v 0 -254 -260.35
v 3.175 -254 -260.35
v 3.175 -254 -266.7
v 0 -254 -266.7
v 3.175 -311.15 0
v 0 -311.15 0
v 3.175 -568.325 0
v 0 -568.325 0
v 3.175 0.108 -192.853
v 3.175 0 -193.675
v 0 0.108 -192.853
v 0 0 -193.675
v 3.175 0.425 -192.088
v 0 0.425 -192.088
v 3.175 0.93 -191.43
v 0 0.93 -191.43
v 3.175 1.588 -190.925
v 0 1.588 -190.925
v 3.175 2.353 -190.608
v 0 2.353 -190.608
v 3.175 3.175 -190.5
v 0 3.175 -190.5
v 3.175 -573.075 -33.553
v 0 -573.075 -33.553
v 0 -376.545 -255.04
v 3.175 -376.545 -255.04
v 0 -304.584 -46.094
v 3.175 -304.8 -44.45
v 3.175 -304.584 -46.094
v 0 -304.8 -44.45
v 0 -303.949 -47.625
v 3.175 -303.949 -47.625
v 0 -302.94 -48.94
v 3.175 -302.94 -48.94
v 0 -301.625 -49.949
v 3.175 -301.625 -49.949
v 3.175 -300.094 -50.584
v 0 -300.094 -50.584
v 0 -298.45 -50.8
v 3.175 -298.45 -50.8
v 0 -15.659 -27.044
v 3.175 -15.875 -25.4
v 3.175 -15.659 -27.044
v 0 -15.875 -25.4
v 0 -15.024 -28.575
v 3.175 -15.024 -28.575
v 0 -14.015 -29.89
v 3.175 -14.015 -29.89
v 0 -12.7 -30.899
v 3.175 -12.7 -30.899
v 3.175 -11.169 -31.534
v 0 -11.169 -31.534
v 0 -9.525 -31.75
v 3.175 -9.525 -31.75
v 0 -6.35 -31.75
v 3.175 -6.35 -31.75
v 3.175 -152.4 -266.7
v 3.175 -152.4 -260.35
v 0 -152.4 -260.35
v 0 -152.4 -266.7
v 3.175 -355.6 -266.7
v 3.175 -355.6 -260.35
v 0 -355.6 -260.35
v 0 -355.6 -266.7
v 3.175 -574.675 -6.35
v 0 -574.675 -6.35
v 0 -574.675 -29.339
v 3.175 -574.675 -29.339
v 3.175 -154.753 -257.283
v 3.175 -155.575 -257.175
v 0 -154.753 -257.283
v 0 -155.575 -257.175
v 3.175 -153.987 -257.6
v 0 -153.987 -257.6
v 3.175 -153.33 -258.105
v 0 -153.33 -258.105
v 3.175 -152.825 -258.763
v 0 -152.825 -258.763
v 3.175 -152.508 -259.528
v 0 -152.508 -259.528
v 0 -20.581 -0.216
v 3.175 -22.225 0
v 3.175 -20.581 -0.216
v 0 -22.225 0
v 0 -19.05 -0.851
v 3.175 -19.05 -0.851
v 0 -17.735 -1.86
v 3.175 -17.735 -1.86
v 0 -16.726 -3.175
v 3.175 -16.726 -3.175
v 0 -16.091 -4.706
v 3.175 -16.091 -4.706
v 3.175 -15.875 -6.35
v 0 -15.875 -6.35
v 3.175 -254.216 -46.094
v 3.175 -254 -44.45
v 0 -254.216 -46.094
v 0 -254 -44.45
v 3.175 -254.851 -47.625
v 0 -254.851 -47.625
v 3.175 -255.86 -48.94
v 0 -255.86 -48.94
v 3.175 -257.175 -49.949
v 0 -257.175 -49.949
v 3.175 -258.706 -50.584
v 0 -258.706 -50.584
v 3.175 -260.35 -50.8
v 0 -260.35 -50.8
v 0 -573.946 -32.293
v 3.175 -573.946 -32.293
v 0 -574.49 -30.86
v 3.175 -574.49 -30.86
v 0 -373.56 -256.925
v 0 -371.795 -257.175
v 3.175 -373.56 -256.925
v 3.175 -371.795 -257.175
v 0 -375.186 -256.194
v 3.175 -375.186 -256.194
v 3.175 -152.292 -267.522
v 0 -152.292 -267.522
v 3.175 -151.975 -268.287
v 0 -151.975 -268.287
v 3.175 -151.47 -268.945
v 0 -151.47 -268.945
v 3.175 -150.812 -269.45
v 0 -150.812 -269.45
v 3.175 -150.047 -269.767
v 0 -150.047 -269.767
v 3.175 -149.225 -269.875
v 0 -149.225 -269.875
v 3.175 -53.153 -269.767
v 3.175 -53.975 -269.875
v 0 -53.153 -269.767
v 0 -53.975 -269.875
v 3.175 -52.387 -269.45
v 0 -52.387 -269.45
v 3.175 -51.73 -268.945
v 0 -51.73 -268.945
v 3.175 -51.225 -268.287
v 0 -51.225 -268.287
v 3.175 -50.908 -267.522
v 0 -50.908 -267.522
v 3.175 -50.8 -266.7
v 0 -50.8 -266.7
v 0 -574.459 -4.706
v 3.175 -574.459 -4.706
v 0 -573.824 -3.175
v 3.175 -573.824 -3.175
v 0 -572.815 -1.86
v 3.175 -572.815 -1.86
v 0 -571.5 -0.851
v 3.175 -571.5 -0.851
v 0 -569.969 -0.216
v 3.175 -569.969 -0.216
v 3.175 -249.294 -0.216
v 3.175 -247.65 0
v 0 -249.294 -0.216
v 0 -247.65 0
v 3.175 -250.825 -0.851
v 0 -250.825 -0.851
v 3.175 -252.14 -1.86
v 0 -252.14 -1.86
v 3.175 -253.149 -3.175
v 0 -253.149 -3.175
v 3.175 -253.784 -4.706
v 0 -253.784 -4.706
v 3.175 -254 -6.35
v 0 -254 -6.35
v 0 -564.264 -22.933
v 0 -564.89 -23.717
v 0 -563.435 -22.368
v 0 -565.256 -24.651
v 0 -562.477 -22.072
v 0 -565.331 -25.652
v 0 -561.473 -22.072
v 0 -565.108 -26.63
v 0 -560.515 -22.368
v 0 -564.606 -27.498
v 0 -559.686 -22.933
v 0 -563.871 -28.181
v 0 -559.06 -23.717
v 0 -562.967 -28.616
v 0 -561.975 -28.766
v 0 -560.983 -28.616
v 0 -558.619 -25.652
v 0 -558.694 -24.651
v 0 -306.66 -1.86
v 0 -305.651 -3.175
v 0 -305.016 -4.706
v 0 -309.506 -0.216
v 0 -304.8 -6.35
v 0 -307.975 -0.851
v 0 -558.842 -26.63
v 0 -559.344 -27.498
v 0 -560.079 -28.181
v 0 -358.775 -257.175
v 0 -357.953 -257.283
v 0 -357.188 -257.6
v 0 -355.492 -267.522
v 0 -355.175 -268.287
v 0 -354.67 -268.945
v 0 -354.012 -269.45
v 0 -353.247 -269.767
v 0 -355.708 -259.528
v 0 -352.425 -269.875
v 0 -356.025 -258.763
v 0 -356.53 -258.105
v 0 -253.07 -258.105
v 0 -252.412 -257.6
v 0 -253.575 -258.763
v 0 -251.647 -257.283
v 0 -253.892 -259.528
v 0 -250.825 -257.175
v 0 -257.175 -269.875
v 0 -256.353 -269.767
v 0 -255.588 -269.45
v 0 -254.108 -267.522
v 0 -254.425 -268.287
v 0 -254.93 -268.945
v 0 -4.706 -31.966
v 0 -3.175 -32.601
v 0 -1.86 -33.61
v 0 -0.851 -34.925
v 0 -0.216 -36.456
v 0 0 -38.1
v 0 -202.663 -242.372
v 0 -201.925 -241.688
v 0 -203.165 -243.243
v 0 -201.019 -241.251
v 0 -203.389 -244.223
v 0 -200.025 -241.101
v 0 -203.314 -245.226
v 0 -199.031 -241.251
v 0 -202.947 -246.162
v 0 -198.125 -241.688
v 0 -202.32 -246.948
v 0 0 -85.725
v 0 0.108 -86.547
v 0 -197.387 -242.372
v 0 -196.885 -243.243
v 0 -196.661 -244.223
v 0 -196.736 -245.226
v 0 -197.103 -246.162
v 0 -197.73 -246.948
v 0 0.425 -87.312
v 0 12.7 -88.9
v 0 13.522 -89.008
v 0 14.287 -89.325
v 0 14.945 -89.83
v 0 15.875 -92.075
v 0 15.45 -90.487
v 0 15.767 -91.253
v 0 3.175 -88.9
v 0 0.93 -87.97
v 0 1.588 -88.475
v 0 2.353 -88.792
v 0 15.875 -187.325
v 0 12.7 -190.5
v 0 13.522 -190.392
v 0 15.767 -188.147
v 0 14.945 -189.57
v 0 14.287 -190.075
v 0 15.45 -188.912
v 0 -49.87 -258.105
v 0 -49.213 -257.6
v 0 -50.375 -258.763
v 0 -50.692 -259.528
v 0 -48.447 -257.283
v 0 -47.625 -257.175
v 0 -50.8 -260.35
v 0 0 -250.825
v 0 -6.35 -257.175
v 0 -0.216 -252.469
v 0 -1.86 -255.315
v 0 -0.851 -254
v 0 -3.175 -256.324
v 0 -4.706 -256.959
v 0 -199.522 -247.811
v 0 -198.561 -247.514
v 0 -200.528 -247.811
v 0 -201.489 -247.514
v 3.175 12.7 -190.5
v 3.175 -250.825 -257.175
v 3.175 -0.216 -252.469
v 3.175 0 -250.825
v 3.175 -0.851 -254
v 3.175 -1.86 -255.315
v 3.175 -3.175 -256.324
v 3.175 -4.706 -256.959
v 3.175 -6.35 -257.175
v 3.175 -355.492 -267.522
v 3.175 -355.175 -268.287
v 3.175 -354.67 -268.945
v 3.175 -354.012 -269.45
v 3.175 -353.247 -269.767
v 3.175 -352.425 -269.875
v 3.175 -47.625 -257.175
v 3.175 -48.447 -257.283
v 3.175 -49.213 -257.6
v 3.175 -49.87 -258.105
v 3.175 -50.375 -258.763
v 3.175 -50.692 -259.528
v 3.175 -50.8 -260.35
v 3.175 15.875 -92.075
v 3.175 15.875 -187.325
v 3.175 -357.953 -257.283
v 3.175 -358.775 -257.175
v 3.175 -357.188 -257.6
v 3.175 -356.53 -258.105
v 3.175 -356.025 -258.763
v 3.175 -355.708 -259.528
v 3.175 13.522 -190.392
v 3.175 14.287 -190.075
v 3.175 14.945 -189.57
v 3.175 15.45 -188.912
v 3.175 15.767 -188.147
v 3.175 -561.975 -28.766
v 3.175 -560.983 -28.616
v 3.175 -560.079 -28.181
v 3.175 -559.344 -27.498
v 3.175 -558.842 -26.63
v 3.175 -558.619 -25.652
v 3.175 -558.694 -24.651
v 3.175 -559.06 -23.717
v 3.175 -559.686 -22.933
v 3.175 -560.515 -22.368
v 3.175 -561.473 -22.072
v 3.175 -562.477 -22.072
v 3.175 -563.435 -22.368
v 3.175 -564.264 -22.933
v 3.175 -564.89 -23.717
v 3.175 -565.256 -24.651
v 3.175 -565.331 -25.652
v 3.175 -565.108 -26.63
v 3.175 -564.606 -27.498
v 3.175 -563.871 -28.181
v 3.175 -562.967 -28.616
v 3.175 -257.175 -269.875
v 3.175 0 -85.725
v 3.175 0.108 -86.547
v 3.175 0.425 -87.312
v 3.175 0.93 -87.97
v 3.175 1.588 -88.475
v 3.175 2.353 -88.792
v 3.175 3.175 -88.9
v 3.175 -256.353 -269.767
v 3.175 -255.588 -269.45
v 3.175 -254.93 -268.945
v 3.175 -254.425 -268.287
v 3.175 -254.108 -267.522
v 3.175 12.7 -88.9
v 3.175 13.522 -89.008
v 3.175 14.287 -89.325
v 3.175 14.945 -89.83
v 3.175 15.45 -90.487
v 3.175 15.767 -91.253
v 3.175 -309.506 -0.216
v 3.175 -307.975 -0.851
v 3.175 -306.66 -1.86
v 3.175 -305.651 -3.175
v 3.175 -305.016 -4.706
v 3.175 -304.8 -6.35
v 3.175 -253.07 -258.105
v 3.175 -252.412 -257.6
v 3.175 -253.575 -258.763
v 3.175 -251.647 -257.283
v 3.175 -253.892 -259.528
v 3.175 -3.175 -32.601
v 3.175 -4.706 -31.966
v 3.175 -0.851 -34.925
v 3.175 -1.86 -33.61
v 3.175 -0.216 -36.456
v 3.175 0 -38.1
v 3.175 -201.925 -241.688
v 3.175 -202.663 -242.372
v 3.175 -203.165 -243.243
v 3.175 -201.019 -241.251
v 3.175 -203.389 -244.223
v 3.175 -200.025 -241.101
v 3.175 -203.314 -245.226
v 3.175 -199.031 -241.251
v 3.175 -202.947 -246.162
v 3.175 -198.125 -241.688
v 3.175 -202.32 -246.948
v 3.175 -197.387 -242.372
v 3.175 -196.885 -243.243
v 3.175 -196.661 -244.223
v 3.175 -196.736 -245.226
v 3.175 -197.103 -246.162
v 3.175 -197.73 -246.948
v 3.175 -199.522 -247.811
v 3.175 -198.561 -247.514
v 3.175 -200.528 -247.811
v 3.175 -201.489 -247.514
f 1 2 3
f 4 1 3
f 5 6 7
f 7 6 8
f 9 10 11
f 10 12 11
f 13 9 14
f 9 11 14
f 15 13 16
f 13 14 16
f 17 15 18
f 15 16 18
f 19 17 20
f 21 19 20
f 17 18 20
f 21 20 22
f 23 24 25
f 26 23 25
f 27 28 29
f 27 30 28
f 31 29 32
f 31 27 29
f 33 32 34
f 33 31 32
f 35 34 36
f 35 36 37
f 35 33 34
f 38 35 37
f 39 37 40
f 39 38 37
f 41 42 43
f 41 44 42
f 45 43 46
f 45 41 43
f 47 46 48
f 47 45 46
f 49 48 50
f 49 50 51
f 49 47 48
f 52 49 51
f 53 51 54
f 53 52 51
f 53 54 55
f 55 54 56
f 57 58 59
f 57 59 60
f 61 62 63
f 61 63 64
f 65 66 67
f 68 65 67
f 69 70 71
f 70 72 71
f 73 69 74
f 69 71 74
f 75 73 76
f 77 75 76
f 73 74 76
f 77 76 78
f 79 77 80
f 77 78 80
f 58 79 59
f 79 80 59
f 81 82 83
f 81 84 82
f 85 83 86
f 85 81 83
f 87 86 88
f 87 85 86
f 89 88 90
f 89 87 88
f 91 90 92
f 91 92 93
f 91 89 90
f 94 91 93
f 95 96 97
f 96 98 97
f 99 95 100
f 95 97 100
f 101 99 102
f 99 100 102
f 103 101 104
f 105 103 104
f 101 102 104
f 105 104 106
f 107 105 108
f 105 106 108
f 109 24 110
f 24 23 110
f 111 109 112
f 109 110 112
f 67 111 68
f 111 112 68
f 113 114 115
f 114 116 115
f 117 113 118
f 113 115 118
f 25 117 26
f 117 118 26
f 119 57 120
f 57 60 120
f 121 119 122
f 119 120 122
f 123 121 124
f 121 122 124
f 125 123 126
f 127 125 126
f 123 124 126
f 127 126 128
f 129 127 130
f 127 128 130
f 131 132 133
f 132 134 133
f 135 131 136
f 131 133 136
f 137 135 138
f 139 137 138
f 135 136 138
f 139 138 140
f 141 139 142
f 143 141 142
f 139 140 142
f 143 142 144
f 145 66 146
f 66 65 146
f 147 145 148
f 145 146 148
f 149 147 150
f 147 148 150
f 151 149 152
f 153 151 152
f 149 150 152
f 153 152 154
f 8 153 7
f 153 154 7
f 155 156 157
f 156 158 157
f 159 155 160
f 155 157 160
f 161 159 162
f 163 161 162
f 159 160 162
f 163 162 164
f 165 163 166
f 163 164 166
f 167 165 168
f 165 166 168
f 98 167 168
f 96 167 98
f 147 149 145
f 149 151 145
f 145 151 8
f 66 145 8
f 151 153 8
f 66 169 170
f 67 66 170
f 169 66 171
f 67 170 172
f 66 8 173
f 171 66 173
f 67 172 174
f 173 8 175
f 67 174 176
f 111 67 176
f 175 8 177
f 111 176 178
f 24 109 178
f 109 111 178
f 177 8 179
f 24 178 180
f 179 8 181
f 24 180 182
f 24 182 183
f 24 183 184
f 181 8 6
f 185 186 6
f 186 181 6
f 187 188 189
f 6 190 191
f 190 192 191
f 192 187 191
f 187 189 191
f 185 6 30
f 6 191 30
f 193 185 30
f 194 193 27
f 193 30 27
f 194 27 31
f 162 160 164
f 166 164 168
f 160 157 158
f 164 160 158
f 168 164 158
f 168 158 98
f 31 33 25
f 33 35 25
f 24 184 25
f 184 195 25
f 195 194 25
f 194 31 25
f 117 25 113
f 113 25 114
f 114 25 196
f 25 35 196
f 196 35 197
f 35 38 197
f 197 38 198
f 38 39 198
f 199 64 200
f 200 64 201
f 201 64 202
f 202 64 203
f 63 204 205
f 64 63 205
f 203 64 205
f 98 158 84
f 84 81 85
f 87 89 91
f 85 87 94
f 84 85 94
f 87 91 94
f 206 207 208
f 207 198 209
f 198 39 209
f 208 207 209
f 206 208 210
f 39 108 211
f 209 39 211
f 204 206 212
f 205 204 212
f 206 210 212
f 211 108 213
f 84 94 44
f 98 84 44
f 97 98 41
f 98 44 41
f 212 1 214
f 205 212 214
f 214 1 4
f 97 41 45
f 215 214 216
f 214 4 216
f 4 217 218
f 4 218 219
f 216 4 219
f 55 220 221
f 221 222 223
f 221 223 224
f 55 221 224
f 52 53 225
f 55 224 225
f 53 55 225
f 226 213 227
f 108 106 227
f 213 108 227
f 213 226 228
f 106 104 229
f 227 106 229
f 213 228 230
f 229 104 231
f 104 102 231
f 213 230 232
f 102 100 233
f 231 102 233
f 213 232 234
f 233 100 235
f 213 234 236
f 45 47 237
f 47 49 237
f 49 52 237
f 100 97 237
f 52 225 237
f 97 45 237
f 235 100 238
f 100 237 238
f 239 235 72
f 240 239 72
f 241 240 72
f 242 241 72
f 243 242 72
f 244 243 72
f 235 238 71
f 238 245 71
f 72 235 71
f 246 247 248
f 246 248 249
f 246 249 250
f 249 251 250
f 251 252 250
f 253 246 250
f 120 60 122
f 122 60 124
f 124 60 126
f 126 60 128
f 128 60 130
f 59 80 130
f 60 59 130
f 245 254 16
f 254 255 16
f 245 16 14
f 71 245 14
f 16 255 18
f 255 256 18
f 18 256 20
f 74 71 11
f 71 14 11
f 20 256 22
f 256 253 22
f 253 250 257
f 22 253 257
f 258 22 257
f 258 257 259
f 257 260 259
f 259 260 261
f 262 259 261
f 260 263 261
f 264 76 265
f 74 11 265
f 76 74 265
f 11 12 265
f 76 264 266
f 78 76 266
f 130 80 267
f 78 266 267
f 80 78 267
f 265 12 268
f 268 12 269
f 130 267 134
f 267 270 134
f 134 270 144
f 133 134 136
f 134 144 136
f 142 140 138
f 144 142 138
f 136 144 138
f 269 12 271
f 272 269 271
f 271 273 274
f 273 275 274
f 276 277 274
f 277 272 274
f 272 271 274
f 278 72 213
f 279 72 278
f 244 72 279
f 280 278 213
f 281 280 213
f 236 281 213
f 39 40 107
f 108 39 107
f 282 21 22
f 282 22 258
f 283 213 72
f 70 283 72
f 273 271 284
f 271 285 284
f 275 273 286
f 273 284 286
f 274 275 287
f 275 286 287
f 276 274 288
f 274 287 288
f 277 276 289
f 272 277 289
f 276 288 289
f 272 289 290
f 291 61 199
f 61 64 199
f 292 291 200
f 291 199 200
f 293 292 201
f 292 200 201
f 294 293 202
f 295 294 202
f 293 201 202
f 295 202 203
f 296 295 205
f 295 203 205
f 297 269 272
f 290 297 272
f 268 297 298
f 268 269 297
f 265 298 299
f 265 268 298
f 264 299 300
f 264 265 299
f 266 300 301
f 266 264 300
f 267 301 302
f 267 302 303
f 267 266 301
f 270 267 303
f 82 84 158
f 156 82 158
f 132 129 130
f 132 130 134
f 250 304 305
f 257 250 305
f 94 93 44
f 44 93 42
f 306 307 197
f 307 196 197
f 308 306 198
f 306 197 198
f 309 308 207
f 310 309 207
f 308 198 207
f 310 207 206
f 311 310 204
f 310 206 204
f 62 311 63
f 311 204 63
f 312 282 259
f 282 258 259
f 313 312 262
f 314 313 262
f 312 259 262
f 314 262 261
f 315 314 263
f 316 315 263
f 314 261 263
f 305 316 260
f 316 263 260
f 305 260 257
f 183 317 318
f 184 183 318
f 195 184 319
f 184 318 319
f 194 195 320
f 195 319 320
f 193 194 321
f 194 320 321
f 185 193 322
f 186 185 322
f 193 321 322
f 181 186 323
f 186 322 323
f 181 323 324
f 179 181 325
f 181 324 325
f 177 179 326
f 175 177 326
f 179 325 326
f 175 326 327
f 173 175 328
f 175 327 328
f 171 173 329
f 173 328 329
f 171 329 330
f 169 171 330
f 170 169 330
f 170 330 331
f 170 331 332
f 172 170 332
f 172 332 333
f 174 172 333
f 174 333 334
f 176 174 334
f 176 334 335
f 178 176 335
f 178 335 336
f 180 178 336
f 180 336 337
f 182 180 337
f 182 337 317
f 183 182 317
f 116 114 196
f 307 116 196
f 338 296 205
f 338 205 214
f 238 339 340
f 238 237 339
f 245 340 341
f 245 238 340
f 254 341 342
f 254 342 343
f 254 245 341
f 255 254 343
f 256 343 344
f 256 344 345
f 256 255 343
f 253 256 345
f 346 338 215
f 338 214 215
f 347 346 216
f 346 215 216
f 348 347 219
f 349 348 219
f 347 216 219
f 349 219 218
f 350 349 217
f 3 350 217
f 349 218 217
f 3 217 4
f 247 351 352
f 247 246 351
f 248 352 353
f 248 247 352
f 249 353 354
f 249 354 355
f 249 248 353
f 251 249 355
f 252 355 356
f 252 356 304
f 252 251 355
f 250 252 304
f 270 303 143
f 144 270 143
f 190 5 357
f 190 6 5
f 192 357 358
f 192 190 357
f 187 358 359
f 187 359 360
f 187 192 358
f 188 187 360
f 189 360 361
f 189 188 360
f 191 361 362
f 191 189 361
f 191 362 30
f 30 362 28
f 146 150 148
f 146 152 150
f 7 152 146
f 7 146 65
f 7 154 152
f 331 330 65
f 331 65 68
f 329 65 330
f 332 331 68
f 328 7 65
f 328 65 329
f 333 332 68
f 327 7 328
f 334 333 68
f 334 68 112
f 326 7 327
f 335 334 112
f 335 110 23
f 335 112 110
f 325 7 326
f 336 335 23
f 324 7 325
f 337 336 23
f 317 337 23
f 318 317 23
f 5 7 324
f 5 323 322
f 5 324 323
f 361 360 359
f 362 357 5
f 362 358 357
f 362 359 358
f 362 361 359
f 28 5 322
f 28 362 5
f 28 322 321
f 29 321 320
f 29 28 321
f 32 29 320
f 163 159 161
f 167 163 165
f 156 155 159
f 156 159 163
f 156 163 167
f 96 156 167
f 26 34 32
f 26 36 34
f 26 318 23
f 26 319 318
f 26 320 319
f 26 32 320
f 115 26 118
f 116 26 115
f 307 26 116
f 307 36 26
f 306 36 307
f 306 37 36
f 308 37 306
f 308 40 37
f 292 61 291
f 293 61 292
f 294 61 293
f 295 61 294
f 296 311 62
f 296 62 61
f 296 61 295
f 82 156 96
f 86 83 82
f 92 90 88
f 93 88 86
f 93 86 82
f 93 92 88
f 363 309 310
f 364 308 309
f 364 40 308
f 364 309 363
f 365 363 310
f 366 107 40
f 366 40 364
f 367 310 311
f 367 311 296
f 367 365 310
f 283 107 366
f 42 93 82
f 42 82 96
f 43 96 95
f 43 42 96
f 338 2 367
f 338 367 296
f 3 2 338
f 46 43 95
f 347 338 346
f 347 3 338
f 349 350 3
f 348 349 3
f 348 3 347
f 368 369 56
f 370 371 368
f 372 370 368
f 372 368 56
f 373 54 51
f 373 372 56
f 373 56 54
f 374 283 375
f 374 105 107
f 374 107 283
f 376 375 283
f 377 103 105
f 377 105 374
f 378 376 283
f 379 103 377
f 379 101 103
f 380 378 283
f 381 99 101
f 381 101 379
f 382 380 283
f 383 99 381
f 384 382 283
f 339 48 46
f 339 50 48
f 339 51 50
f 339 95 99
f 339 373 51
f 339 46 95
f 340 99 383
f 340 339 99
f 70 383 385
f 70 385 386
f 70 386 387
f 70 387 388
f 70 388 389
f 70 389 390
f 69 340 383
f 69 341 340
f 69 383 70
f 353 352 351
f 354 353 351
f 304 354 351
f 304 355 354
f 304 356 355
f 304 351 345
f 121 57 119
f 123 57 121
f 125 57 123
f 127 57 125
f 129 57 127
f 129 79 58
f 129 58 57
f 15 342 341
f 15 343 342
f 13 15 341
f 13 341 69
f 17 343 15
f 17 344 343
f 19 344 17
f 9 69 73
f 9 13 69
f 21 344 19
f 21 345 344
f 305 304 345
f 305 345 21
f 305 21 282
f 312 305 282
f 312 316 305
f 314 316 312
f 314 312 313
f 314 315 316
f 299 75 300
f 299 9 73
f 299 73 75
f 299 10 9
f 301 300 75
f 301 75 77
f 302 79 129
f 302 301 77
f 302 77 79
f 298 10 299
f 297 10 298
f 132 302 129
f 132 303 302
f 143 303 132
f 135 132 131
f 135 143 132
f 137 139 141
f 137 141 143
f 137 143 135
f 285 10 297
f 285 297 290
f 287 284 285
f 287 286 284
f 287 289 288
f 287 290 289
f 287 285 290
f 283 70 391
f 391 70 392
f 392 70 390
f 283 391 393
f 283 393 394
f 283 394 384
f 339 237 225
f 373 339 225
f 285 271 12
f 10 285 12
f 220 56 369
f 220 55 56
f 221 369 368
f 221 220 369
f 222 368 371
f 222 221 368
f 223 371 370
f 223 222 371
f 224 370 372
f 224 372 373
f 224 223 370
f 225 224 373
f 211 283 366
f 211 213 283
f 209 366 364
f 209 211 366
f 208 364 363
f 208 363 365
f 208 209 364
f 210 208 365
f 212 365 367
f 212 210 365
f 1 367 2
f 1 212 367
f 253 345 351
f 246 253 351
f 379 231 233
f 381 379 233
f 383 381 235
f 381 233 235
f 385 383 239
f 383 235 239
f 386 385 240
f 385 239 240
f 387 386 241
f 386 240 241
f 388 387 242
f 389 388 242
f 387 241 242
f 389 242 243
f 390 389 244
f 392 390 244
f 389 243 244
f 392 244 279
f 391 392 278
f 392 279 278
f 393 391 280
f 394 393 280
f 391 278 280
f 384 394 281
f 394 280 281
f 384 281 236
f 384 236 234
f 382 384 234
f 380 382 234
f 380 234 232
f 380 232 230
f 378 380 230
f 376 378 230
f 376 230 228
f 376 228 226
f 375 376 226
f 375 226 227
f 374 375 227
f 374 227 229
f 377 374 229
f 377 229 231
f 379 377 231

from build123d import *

# Parameters (mm, degrees)
BOSS_EXTRUDE1_DEPTH              = 3.175
SKETCH2_R                        = 3.3655
CUT_EXTRUDE1_DEPTH               = 4.175
SKETCH8_W                        = 50.8
SKETCH8_H                        = 50.8
CUT_EXTRUDE9_DEPTH               = 4.175
FILLET2_R                        = 6.35
SKETCH9_W                        = 101.6
SKETCH9_H                        = 15.875
SKETCH9_W_2                      = 12.7
SKETCH9_H_2                      = 101.6
BOSS_EXTRUDE2_DEPTH              = 3.175
FILLET3_R                        = 3.175
SKETCH10_W                       = 31.75
SKETCH10_H                       = 15.875
CUT_EXTRUDE12_DEPTH              = 4.175
FILLET4_R                        = 6.35
F_17_64_0_26563_DIAMETER_HOLE1_D = 6.747002


with BuildPart() as part:
    # Sketch1 → Boss-Extrude1 (new body)
    with BuildSketch(Plane(origin=(0, 0, 0), x_dir=(0, 0, -1), z_dir=(1, 0, 0))):
        Polygon((0, 0), (0, -574.675), (31.75, -574.675), (257.175, -374.65), (257.175, 0), align=None)
    extrude(amount=BOSS_EXTRUDE1_DEPTH)

    # Sketch2 → Cut-Extrude1 (cut, through all)
    with BuildSketch(Plane(origin=(3.175, 0, 0), x_dir=(0, 0, -1), z_dir=(1, 0, 0))):
        with Locations((25.4, -561.975)):
            Circle(SKETCH2_R)
    extrude(amount=-CUT_EXTRUDE1_DEPTH, mode=Mode.SUBTRACT)

    # Sketch8 → Cut-Extrude9 (cut, through all)
    with BuildSketch(Plane(origin=(3.175, 0, 0), x_dir=(0, 0, -1), z_dir=(1, 0, 0))):
        with Locations((25.4, -279.4)):
            Rectangle(SKETCH8_W, SKETCH8_H)
    extrude(amount=-CUT_EXTRUDE9_DEPTH, mode=Mode.SUBTRACT)

    # Fillet2
    fillet2_edges = [part.edges().sort_by_distance(p)[0] for p in [
        (1.5875, -304.8, 0),
        (1.5875, -254, 0),
        (1.5875, -254, -50.8),
        (1.5875, -304.8, -50.8),
    ]]
    fillet(fillet2_edges, radius=FILLET2_R)

    # Sketch9 → Boss-Extrude2 (add)
    with BuildSketch(Plane(origin=(3.175, 0, 0), x_dir=(0, 0, -1), z_dir=(1, 0, 0))):
        with Locations((139.7, 7.9375)):
            Rectangle(SKETCH9_W, SKETCH9_H)
        with Locations((263.525, -101.6)):
            Rectangle(SKETCH9_W_2, SKETCH9_H_2)
        with Locations((263.525, -304.8)):
            Rectangle(SKETCH9_W_2, SKETCH9_H_2)
    extrude(amount=-BOSS_EXTRUDE2_DEPTH)

    # Fillet3
    fillet3_edges = [part.edges().sort_by_distance(p)[0] for p in [
        (1.5875, 0, -88.9),
        (1.5875, 15.875, -88.9),
        (1.5875, 15.875, -190.5),
        (1.5875, 0, -190.5),
        (1.5875, -152.4, -257.175),
        (1.5875, -50.8, -257.175),
        (1.5875, -50.8, -269.875),
        (1.5875, -152.4, -269.875),
        (1.5875, -355.6, -257.175),
        (1.5875, -254, -257.175),
        (1.5875, -254, -269.875),
        (1.5875, -355.6, -269.875),
    ]]
    fillet(fillet3_edges, radius=FILLET3_R)

    # Sketch10 → Cut-Extrude12 (cut, through all)
    with BuildSketch(Plane(origin=(3.175, 0, 0), x_dir=(0, 0, -1), z_dir=(1, 0, 0))):
        with Locations((15.875, -7.9375)):
            Rectangle(SKETCH10_W, SKETCH10_H)
    extrude(amount=-CUT_EXTRUDE12_DEPTH, mode=Mode.SUBTRACT)

    # Fillet4
    fillet4_edges = [part.edges().sort_by_distance(p)[0] for p in [
        (1.5875, -15.875, 0),
        (1.5875, 0, -31.75),
        (1.5875, -15.875, -31.75),
        (1.5875, 0, -257.175),
        (1.5875, -374.65, -257.175),
        (1.5875, -574.675, -31.75),
        (1.5875, -574.675, 0),
    ]]
    fillet(fillet4_edges, radius=FILLET4_R)

    # 17/64 (0.26563) Diameter Hole1 (through all)
    with Locations(Plane(origin=(3.175, 0, 0), x_dir=(0, 0, -1), z_dir=(1, 0, 0))):
        with Locations((244.475, -200.025)):
            Hole(F_17_64_0_26563_DIAMETER_HOLE1_D / 2)


solid = part.part
